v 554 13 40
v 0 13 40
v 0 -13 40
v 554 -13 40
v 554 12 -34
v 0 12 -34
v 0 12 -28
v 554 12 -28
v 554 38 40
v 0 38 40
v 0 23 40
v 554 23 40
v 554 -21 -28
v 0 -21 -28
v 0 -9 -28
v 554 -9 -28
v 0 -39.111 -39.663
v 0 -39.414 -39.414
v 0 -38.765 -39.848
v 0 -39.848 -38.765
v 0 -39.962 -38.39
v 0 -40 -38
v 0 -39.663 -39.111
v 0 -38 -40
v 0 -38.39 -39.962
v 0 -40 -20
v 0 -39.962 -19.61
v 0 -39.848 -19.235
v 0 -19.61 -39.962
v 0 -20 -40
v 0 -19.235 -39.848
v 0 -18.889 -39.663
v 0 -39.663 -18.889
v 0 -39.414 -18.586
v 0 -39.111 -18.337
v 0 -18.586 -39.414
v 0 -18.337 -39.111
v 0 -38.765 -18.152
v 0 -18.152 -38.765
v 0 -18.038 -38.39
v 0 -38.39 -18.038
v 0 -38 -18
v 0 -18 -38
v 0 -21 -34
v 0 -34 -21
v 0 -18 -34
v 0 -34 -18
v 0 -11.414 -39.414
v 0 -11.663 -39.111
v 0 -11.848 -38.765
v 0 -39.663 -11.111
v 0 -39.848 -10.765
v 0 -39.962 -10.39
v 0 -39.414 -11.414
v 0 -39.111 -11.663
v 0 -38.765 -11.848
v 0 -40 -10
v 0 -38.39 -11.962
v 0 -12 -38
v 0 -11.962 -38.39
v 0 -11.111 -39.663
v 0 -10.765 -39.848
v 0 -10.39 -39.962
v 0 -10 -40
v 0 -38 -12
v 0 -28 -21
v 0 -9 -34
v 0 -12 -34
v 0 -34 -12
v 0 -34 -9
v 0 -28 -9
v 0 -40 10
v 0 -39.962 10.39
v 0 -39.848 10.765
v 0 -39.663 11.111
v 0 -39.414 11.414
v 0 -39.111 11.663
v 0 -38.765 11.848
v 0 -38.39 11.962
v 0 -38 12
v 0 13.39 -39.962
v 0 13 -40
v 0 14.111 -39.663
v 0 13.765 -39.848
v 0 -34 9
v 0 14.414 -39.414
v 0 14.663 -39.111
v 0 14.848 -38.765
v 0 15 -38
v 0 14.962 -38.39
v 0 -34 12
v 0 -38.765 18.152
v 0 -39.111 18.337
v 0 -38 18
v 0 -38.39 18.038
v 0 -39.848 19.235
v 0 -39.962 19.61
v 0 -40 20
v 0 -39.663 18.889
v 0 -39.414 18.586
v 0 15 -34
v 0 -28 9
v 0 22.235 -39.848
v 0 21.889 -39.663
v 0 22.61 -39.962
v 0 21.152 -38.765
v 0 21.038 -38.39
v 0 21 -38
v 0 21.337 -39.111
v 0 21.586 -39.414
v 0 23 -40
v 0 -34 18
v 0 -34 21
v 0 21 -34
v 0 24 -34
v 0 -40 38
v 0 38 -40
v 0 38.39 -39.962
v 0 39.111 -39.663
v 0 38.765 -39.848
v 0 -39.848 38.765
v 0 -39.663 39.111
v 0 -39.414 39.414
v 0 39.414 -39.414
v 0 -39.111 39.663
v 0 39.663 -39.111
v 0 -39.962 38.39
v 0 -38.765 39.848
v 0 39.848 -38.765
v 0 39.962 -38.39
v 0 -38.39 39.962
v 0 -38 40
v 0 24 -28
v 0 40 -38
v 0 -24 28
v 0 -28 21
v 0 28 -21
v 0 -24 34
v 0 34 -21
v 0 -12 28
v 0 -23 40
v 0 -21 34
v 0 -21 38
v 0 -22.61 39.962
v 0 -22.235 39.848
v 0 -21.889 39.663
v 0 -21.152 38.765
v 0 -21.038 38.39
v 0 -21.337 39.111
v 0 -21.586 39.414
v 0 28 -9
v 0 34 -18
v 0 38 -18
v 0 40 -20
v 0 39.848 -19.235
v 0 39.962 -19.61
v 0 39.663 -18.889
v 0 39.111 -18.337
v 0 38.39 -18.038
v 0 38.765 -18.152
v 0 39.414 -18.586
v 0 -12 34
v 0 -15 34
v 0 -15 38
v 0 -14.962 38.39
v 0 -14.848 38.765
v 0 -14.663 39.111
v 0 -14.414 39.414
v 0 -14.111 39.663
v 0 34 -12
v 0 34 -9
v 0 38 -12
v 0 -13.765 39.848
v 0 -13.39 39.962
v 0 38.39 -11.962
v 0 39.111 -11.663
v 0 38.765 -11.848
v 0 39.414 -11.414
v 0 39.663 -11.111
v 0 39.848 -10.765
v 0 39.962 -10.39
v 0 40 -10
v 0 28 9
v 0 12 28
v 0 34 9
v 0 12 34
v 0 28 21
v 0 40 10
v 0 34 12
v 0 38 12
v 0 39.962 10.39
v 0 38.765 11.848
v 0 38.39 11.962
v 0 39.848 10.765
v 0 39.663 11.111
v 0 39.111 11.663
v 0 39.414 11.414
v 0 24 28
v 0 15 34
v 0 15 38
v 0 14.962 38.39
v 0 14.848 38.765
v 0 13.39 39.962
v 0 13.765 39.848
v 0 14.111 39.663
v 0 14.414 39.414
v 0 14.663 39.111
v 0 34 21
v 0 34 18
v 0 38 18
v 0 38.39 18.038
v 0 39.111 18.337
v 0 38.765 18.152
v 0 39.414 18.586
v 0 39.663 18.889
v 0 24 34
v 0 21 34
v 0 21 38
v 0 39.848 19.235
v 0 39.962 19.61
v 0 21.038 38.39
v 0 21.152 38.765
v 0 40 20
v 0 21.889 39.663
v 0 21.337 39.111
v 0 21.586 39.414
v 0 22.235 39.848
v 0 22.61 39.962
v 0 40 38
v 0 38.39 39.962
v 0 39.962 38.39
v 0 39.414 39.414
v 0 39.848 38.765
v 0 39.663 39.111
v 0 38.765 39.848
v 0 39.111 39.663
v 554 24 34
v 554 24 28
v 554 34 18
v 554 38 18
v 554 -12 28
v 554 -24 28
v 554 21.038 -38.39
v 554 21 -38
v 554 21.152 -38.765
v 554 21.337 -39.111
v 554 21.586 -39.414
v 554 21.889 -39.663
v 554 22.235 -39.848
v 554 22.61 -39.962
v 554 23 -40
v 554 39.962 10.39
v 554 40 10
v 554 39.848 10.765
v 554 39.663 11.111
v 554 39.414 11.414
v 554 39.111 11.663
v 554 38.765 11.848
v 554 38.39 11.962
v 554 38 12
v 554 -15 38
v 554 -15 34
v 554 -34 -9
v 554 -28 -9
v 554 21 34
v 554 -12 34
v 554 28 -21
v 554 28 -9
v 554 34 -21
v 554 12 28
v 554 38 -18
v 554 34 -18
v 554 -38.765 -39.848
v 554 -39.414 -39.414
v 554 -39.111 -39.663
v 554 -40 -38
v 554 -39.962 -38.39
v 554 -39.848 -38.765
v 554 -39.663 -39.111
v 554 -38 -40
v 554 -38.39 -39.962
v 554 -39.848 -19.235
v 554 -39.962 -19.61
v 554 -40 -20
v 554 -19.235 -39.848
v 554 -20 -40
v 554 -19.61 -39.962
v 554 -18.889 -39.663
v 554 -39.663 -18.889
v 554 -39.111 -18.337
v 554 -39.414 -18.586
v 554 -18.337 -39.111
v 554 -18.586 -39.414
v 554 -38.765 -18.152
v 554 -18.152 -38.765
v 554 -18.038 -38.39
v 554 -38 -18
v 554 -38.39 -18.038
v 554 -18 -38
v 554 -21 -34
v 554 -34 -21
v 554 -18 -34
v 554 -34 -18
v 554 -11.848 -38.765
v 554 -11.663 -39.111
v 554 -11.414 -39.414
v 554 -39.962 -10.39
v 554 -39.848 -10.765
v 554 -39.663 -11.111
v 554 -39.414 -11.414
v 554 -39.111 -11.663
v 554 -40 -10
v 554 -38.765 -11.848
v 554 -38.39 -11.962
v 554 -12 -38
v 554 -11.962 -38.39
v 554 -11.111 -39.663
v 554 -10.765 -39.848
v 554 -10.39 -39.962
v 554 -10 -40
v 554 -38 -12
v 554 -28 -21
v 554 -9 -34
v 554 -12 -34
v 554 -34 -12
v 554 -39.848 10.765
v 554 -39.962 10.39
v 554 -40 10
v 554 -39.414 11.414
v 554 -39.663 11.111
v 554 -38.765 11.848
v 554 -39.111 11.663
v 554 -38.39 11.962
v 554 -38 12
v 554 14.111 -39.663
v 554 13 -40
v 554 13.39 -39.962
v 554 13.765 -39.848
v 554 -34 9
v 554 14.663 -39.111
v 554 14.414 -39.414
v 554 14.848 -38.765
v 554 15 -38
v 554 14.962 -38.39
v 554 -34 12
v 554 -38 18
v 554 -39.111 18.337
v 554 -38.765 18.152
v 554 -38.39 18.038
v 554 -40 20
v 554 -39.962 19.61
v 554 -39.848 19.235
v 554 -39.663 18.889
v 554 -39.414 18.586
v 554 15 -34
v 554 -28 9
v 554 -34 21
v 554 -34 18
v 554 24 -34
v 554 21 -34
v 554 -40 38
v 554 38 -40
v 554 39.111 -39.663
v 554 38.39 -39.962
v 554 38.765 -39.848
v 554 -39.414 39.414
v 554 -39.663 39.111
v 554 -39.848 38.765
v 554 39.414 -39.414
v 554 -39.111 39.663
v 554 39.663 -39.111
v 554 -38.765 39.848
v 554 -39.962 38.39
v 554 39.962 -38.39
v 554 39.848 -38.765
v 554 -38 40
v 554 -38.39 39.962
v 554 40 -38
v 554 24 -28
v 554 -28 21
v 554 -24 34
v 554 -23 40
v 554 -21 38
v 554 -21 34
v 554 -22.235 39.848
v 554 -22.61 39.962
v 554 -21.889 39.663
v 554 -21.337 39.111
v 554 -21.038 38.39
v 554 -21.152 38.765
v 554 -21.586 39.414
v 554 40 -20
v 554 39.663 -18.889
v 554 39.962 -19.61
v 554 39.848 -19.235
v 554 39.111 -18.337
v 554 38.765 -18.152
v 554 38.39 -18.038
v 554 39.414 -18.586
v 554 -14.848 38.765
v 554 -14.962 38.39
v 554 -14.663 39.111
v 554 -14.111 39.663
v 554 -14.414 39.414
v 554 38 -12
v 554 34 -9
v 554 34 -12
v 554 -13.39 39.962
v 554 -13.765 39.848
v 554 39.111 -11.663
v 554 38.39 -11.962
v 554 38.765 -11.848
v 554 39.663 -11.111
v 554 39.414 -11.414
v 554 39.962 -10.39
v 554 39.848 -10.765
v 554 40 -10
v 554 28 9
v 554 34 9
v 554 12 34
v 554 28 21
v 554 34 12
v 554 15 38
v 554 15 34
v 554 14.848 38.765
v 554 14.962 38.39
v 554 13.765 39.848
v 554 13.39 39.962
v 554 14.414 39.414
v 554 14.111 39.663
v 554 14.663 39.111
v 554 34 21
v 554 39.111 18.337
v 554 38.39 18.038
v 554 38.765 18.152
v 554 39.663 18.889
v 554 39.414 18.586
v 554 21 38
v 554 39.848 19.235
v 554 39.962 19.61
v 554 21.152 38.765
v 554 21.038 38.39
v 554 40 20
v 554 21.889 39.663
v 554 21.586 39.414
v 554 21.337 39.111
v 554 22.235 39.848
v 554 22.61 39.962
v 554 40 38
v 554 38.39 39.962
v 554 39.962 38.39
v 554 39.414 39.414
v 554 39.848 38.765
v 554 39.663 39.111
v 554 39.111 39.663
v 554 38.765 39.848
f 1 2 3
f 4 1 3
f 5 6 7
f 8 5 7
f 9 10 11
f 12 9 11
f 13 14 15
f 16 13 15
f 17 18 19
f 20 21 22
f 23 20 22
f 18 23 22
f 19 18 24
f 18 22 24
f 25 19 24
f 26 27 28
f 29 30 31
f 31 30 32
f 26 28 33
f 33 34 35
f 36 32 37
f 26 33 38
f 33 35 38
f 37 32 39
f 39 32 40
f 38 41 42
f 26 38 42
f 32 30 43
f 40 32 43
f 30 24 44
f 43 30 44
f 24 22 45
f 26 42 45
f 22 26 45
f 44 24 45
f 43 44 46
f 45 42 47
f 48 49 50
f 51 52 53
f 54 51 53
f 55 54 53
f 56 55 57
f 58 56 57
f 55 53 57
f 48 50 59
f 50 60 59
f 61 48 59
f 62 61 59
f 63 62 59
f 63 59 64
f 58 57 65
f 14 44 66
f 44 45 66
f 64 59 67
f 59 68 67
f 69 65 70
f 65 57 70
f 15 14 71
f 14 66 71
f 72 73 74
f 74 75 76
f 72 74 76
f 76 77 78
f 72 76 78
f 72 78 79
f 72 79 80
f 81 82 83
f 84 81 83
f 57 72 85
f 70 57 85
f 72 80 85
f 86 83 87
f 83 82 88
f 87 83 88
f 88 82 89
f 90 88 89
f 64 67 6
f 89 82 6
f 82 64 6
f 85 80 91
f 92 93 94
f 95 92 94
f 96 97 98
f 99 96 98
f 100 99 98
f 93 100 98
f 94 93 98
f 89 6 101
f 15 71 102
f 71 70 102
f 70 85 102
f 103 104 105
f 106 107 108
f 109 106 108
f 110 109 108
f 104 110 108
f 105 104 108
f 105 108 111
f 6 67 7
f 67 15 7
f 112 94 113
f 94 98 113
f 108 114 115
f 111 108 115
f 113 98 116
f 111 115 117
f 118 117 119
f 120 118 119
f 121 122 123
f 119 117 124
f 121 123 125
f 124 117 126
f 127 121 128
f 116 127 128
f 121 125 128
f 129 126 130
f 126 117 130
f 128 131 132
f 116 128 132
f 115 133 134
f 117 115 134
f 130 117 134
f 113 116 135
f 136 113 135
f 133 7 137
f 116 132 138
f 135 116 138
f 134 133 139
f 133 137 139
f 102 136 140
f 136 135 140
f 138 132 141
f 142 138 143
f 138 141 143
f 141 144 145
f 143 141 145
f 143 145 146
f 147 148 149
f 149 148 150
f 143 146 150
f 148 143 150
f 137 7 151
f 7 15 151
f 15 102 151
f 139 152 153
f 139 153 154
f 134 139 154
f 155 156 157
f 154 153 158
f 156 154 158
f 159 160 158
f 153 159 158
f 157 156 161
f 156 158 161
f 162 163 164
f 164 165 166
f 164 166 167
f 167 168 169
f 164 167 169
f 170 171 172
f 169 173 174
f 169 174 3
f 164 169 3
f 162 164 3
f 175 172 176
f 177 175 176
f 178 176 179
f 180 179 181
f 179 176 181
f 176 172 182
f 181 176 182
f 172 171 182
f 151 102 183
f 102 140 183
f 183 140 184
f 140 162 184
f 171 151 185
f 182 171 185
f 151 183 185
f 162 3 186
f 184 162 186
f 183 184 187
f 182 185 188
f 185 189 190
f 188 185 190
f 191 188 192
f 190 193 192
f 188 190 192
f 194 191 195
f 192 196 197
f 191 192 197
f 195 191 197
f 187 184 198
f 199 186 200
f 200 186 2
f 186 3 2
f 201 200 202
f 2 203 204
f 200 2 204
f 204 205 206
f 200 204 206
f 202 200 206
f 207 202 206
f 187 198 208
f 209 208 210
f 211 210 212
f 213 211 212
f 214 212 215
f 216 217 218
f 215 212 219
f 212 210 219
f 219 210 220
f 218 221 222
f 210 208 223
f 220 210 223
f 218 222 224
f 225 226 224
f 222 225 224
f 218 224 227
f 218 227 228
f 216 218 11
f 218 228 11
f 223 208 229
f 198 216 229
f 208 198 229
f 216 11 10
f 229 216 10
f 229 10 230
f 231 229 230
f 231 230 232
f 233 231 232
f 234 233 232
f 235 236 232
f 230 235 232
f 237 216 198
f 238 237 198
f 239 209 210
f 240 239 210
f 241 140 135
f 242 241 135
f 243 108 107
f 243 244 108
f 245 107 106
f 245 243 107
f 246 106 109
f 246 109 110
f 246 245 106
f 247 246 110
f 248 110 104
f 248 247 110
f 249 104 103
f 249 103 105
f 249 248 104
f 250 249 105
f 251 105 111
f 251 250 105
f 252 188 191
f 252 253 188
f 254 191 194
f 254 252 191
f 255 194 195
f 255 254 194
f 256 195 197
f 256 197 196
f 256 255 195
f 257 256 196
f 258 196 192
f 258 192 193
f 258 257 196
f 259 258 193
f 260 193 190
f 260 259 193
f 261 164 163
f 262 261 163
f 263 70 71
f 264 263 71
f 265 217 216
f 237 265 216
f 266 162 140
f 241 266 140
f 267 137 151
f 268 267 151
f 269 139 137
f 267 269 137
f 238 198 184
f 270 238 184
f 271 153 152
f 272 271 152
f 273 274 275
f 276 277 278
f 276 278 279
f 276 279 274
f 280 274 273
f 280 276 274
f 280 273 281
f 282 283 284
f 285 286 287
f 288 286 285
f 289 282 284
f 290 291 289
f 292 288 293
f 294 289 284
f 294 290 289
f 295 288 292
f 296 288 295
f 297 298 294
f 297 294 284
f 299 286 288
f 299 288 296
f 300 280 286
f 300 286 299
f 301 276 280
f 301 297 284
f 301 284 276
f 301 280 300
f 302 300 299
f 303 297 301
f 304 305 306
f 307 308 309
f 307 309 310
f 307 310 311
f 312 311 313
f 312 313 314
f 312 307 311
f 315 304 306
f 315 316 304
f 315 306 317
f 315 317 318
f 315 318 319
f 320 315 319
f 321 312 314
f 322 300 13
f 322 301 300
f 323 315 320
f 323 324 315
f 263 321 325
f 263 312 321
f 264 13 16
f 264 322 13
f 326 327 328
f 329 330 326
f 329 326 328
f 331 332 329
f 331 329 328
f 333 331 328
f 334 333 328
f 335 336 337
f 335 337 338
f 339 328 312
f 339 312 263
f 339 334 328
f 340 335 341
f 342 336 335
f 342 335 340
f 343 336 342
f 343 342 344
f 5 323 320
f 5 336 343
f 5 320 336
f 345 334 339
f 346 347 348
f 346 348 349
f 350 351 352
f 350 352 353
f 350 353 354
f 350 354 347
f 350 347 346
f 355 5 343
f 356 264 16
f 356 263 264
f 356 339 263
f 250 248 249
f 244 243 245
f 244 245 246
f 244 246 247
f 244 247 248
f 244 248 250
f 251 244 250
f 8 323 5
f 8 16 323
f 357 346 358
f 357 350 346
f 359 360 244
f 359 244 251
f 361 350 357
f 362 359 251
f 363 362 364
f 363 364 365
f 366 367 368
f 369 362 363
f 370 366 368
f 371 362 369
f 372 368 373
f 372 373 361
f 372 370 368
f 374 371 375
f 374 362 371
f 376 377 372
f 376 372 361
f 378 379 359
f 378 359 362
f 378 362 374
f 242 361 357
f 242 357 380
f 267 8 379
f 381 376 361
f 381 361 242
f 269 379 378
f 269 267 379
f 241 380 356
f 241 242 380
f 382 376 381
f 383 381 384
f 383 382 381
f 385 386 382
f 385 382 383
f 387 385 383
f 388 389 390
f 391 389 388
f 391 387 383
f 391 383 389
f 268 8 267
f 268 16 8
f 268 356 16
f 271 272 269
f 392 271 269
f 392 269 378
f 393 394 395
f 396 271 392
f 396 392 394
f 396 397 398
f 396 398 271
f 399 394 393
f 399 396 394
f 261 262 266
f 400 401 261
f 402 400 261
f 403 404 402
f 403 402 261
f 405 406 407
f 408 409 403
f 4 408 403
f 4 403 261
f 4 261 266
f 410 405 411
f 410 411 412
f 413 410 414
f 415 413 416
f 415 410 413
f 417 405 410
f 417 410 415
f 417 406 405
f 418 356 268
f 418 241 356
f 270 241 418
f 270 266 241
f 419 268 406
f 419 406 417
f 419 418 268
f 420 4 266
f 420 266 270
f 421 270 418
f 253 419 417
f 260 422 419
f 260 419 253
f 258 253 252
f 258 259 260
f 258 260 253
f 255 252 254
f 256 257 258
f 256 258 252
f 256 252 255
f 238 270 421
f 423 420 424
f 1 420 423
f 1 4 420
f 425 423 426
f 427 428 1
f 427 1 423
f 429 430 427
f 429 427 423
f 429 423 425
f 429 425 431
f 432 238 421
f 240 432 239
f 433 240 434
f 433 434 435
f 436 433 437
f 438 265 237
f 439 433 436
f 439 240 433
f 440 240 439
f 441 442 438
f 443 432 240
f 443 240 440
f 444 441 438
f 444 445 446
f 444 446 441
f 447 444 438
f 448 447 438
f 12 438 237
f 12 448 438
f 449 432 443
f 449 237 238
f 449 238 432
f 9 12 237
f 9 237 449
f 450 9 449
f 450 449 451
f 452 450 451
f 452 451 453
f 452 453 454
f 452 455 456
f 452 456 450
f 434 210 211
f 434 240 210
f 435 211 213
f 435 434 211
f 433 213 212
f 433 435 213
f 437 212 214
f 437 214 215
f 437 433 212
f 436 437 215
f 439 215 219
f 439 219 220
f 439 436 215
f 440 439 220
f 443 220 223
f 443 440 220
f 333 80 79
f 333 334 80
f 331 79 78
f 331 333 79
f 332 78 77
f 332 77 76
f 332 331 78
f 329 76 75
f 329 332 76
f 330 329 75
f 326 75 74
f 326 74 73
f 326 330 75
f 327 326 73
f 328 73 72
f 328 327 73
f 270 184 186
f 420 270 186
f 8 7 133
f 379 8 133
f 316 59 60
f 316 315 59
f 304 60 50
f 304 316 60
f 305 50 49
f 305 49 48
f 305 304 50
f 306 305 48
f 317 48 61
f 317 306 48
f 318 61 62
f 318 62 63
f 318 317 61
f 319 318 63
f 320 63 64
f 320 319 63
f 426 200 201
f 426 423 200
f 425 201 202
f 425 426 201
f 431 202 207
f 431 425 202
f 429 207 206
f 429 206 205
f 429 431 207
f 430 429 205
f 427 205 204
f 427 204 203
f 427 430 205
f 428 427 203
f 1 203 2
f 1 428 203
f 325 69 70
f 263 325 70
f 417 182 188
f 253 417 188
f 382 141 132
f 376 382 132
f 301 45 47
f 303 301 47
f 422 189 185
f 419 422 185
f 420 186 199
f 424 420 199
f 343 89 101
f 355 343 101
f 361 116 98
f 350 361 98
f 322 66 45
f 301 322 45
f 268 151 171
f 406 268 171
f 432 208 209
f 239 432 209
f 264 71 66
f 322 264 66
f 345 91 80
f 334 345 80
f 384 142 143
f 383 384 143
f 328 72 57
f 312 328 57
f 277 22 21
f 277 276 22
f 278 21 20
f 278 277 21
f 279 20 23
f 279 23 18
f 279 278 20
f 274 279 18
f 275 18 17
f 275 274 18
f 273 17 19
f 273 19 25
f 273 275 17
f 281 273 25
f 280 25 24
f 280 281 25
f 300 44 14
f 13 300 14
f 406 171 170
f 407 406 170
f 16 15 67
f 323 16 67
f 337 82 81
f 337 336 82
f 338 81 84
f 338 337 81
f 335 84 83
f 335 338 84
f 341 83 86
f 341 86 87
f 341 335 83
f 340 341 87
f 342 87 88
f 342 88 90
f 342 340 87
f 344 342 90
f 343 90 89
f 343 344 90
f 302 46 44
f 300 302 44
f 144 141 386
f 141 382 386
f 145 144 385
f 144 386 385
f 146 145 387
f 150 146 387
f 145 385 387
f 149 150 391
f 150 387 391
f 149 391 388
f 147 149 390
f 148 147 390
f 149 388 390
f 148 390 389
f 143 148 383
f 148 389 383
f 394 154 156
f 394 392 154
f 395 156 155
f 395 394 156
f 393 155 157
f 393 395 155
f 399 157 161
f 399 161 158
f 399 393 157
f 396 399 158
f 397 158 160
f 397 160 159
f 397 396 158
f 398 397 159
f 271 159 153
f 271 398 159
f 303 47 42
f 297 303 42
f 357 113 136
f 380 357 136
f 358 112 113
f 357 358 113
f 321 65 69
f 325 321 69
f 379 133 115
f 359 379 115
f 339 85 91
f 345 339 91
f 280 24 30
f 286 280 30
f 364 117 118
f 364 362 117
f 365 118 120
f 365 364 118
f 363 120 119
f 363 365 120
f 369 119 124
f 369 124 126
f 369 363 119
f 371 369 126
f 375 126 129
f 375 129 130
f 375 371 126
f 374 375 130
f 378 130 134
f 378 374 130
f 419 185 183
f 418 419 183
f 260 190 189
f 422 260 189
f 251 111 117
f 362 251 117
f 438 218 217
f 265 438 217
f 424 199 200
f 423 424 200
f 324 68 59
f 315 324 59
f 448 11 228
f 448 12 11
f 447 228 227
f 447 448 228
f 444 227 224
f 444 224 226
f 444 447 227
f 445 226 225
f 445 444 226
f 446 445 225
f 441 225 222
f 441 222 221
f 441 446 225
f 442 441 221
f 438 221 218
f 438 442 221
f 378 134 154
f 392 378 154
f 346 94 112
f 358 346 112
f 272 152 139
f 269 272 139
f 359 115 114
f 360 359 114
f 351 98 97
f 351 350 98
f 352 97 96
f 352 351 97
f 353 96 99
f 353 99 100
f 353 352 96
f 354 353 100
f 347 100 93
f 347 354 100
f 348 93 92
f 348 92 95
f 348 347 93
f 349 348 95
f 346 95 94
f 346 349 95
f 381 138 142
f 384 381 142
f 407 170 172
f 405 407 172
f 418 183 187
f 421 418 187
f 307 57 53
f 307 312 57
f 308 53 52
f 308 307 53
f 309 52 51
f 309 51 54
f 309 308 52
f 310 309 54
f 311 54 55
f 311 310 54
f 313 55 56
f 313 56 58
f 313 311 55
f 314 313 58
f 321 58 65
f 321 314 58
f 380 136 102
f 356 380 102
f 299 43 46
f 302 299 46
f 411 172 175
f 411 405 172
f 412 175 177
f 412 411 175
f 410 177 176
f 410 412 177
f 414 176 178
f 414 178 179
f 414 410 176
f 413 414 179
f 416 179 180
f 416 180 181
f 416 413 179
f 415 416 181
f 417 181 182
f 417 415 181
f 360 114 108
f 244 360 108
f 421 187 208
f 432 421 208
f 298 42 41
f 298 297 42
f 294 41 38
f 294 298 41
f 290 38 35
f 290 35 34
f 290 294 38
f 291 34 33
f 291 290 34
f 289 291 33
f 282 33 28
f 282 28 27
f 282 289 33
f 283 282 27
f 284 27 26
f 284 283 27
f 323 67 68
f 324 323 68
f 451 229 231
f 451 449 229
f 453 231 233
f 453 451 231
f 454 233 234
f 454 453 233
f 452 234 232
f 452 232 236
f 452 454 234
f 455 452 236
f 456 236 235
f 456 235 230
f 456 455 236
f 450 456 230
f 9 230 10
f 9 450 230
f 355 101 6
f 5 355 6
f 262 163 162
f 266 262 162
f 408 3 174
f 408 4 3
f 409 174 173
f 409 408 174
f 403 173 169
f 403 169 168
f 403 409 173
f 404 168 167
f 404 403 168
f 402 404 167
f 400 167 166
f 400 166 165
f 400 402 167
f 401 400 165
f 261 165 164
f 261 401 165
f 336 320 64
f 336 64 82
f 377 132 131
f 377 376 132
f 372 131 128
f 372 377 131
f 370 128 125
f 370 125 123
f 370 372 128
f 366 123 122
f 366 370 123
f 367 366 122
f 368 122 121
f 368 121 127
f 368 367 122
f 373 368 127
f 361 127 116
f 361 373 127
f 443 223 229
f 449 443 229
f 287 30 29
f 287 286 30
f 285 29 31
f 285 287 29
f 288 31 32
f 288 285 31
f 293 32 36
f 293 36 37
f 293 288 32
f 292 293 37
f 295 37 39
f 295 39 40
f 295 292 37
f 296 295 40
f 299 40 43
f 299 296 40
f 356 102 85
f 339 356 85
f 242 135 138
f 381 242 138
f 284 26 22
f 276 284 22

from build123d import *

# Parameters (mm, degrees)
F1_DEPTH = 554
F2_R     = 2


with BuildPart() as f1:
    # F0 (on Right) → F1 (new body)
    with BuildSketch(Plane.YZ):
        Polygon((-21, 40), (-40, 40), (-40, 18), (-34, 18), (-34, 21), (-28, 21), (-28, 9), (-34, 9), (-34, 12), (-40, 12), (-40, -12), (-34, -12), (-34, -9), (-28, -9), (-28, -21), (-34, -21), (-34, -18), (-40, -18), (-40, -40), (-18, -40), (-18, -34), (-21, -34), (-21, -28), (-9, -28), (-9, -34), (-12, -34), (-12, -40), (15, -40), (15, -34), (12, -34), (12, -28), (24, -28), (24, -34), (21, -34), (21, -40), (40, -40), (40, -18), (34, -18), (34, -21), (28, -21), (28, -9), (34, -9), (34, -12), (40, -12), (40, 12), (34, 12), (34, 9), (28, 9), (28, 21), (34, 21), (34, 18), (40, 18), (40, 40), (21, 40), (21, 34), (24, 34), (24, 28), (12, 28), (12, 34), (15, 34), (15, 40), (-15, 40), (-15, 34), (-12, 34), (-12, 28), (-24, 28), (-24, 34), (-21, 34), align=None)
    extrude(amount=F1_DEPTH)

    # F2
    f2_edges = [f1.edges().sort_by_distance(p)[0] for p in [
        (277, 40, 40),
        (277, 40, -40),
        (277, -40, 40),
        (277, -40, -40),
        (277, -40, -18),
        (277, -40, -12),
        (277, -40, 12),
        (277, -40, 18),
        (277, 21, 40),
        (277, 15, 40),
        (277, -15, 40),
        (277, -21, 40),
        (277, 40, 18),
        (277, 40, 12),
        (277, 40, -12),
        (277, 40, -18),
        (277, 21, -40),
        (277, 15, -40),
        (277, -12, -40),
        (277, -18, -40),
    ]]
    fillet(f2_edges, radius=F2_R)


solid = f1.part
